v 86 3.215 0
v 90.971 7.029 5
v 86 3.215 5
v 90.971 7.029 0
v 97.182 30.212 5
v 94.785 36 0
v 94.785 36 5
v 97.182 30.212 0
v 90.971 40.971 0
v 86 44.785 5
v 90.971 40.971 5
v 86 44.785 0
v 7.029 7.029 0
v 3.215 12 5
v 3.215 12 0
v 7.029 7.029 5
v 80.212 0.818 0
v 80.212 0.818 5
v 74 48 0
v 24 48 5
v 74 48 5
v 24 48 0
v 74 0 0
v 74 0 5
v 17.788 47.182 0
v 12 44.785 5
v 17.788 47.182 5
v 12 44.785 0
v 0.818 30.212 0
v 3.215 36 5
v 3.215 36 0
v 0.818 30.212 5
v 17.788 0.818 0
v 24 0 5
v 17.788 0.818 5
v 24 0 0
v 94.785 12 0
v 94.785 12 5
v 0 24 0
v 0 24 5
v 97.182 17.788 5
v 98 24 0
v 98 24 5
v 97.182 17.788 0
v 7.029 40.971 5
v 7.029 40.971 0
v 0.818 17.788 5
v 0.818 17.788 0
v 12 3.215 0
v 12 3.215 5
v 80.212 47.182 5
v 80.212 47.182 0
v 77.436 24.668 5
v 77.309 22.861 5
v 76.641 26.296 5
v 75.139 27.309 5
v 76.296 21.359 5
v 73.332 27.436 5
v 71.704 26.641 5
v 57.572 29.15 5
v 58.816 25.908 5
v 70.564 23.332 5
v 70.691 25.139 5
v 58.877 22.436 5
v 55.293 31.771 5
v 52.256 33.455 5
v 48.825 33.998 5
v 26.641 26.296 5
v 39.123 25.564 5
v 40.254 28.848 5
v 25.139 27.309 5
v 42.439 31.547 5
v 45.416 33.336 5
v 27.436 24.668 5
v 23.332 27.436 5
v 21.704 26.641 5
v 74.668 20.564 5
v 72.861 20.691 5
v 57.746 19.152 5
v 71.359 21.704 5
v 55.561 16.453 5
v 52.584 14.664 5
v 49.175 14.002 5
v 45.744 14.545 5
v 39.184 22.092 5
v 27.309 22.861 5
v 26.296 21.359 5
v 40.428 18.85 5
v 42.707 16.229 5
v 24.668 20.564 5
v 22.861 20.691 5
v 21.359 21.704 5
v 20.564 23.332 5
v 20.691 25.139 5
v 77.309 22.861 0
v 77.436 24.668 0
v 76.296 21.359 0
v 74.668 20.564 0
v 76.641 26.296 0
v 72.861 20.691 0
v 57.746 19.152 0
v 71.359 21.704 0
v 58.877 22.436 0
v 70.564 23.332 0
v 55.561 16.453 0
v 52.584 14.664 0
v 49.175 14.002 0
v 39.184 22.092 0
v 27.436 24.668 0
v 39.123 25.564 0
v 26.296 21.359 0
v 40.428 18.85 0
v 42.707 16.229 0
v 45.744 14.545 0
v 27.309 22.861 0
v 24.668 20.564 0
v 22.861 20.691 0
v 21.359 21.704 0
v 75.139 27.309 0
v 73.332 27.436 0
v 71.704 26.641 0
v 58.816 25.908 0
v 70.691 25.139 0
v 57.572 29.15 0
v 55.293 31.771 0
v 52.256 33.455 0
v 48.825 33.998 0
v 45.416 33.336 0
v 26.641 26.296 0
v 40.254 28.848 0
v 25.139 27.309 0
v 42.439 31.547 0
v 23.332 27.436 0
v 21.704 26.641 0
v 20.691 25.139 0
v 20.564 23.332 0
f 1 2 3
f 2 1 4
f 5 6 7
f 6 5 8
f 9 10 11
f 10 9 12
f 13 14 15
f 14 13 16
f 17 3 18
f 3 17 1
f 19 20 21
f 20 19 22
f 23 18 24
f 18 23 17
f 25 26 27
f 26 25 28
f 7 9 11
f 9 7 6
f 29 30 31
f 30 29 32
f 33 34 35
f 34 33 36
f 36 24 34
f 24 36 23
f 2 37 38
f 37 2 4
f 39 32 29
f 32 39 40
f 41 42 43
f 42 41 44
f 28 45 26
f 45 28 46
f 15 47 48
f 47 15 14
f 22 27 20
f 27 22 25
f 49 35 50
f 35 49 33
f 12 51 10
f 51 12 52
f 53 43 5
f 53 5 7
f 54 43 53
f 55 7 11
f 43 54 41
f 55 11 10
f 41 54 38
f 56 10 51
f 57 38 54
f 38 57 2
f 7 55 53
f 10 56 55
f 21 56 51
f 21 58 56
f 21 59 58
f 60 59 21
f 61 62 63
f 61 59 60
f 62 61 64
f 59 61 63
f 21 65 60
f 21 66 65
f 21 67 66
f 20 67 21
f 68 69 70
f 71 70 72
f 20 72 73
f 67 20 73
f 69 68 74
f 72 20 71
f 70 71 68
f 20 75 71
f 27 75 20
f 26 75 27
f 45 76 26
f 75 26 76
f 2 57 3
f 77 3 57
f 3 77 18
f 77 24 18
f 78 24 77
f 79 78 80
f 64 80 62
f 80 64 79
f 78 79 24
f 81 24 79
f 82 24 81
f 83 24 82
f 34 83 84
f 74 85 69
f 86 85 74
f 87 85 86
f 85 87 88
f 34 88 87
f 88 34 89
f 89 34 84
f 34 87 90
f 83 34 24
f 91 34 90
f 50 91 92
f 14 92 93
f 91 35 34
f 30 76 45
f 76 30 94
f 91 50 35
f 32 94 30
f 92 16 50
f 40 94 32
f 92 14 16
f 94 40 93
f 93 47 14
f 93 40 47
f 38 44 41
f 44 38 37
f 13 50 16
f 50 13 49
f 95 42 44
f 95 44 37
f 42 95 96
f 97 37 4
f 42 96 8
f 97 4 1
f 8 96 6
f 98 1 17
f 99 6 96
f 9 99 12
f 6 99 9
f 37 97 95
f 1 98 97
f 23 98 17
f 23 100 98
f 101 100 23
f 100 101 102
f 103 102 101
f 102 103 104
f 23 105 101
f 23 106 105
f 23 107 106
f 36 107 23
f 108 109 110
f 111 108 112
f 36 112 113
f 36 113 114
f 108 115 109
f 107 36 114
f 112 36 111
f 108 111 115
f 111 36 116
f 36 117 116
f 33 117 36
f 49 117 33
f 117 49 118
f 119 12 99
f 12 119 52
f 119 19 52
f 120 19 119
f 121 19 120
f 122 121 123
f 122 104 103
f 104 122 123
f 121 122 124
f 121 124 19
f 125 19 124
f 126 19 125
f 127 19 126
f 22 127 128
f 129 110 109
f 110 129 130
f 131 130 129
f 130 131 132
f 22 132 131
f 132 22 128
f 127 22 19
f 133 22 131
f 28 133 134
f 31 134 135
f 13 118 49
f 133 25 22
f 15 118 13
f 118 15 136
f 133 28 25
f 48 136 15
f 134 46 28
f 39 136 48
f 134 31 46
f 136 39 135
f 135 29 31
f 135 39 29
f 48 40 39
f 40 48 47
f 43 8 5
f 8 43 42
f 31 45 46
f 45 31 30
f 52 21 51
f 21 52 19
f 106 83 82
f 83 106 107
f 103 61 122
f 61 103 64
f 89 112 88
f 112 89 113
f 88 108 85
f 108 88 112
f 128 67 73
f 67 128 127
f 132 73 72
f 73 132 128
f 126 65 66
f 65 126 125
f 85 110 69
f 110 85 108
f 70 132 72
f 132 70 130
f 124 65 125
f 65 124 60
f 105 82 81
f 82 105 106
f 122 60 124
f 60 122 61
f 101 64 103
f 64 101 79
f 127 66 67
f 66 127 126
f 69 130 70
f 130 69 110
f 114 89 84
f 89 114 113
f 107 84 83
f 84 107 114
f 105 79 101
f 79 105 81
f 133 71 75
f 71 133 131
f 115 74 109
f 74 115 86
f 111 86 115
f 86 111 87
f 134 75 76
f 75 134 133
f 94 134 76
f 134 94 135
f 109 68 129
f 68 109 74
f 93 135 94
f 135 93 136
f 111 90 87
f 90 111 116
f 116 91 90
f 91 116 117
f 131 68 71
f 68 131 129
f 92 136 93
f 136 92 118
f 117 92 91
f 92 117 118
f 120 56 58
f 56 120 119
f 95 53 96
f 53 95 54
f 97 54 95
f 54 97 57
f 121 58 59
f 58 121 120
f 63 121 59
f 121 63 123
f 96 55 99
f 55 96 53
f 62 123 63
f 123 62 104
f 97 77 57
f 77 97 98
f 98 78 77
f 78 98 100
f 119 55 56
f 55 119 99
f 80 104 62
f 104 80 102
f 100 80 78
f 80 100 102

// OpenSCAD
$fn = 32;

// ----------------------------------------------------------------------
// Spacer plate: obround span 50, caps R24
// ----------------------------------------------------------------------

// --- parameters (mm) ---
bore_r = 10;              // centre bore radius
bolt_r = 3.5;             // bolt hole radius
plate_t = 5;              // plate thickness, Z (extrusion height)
span = 50;                // obround span
cap_r = 24;               // cap radius

profile = [[24, 48], [17.788, 47.182], [12, 44.785], [7.029, 40.971], [3.215, 36], [0.818, 30.212], [0, 24], [0.818, 17.788], [3.215, 12], [7.029, 7.029], [12, 3.215], [17.788, 0.818], [24, 0], [74, 0], [80.212, 0.818], [86, 3.215], [90.971, 7.029], [94.785, 12], [97.182, 17.788], [98, 24], [97.182, 30.212], [94.785, 36], [90.971, 40.971], [86, 44.785], [80.212, 47.182], [74, 48]];  // primary outline, 26 points, counter clockwise
void_1 = [[58.816, 25.908], [57.572, 29.15], [55.293, 31.771], [52.256, 33.455], [48.825, 33.998], [45.416, 33.336], [42.439, 31.547], [40.254, 28.848], [39.123, 25.564], [39.184, 22.092], [40.428, 18.85], [42.707, 16.229], [45.744, 14.545], [49.175, 14.002], [52.584, 14.664], [55.561, 16.453], [57.746, 19.152], [58.877, 22.436]];  // centre bore, 18 points
void_2 = [[27.436, 24.668], [26.641, 26.296], [25.139, 27.309], [23.332, 27.436], [21.704, 26.641], [20.691, 25.139], [20.564, 23.332], [21.359, 21.704], [22.861, 20.691], [24.668, 20.564], [26.296, 21.359], [27.309, 22.861]];  // end hole, 12 points
void_3 = [[77.436, 24.668], [76.641, 26.296], [75.139, 27.309], [73.332, 27.436], [71.704, 26.641], [70.691, 25.139], [70.564, 23.332], [71.359, 21.704], [72.861, 20.691], [74.668, 20.564], [76.296, 21.359], [77.309, 22.861]];  // end hole, 12 points

// --- the one profile operation ---
difference() {
  linear_extrude(height = plate_t) polygon(points = profile);
  translate([0, 0, -1])
    linear_extrude(height = plate_t + 2) polygon(points = void_1);
  translate([0, 0, -1])
    linear_extrude(height = plate_t + 2) polygon(points = void_2);
  translate([0, 0, -1])
    linear_extrude(height = plate_t + 2) polygon(points = void_3);
}
